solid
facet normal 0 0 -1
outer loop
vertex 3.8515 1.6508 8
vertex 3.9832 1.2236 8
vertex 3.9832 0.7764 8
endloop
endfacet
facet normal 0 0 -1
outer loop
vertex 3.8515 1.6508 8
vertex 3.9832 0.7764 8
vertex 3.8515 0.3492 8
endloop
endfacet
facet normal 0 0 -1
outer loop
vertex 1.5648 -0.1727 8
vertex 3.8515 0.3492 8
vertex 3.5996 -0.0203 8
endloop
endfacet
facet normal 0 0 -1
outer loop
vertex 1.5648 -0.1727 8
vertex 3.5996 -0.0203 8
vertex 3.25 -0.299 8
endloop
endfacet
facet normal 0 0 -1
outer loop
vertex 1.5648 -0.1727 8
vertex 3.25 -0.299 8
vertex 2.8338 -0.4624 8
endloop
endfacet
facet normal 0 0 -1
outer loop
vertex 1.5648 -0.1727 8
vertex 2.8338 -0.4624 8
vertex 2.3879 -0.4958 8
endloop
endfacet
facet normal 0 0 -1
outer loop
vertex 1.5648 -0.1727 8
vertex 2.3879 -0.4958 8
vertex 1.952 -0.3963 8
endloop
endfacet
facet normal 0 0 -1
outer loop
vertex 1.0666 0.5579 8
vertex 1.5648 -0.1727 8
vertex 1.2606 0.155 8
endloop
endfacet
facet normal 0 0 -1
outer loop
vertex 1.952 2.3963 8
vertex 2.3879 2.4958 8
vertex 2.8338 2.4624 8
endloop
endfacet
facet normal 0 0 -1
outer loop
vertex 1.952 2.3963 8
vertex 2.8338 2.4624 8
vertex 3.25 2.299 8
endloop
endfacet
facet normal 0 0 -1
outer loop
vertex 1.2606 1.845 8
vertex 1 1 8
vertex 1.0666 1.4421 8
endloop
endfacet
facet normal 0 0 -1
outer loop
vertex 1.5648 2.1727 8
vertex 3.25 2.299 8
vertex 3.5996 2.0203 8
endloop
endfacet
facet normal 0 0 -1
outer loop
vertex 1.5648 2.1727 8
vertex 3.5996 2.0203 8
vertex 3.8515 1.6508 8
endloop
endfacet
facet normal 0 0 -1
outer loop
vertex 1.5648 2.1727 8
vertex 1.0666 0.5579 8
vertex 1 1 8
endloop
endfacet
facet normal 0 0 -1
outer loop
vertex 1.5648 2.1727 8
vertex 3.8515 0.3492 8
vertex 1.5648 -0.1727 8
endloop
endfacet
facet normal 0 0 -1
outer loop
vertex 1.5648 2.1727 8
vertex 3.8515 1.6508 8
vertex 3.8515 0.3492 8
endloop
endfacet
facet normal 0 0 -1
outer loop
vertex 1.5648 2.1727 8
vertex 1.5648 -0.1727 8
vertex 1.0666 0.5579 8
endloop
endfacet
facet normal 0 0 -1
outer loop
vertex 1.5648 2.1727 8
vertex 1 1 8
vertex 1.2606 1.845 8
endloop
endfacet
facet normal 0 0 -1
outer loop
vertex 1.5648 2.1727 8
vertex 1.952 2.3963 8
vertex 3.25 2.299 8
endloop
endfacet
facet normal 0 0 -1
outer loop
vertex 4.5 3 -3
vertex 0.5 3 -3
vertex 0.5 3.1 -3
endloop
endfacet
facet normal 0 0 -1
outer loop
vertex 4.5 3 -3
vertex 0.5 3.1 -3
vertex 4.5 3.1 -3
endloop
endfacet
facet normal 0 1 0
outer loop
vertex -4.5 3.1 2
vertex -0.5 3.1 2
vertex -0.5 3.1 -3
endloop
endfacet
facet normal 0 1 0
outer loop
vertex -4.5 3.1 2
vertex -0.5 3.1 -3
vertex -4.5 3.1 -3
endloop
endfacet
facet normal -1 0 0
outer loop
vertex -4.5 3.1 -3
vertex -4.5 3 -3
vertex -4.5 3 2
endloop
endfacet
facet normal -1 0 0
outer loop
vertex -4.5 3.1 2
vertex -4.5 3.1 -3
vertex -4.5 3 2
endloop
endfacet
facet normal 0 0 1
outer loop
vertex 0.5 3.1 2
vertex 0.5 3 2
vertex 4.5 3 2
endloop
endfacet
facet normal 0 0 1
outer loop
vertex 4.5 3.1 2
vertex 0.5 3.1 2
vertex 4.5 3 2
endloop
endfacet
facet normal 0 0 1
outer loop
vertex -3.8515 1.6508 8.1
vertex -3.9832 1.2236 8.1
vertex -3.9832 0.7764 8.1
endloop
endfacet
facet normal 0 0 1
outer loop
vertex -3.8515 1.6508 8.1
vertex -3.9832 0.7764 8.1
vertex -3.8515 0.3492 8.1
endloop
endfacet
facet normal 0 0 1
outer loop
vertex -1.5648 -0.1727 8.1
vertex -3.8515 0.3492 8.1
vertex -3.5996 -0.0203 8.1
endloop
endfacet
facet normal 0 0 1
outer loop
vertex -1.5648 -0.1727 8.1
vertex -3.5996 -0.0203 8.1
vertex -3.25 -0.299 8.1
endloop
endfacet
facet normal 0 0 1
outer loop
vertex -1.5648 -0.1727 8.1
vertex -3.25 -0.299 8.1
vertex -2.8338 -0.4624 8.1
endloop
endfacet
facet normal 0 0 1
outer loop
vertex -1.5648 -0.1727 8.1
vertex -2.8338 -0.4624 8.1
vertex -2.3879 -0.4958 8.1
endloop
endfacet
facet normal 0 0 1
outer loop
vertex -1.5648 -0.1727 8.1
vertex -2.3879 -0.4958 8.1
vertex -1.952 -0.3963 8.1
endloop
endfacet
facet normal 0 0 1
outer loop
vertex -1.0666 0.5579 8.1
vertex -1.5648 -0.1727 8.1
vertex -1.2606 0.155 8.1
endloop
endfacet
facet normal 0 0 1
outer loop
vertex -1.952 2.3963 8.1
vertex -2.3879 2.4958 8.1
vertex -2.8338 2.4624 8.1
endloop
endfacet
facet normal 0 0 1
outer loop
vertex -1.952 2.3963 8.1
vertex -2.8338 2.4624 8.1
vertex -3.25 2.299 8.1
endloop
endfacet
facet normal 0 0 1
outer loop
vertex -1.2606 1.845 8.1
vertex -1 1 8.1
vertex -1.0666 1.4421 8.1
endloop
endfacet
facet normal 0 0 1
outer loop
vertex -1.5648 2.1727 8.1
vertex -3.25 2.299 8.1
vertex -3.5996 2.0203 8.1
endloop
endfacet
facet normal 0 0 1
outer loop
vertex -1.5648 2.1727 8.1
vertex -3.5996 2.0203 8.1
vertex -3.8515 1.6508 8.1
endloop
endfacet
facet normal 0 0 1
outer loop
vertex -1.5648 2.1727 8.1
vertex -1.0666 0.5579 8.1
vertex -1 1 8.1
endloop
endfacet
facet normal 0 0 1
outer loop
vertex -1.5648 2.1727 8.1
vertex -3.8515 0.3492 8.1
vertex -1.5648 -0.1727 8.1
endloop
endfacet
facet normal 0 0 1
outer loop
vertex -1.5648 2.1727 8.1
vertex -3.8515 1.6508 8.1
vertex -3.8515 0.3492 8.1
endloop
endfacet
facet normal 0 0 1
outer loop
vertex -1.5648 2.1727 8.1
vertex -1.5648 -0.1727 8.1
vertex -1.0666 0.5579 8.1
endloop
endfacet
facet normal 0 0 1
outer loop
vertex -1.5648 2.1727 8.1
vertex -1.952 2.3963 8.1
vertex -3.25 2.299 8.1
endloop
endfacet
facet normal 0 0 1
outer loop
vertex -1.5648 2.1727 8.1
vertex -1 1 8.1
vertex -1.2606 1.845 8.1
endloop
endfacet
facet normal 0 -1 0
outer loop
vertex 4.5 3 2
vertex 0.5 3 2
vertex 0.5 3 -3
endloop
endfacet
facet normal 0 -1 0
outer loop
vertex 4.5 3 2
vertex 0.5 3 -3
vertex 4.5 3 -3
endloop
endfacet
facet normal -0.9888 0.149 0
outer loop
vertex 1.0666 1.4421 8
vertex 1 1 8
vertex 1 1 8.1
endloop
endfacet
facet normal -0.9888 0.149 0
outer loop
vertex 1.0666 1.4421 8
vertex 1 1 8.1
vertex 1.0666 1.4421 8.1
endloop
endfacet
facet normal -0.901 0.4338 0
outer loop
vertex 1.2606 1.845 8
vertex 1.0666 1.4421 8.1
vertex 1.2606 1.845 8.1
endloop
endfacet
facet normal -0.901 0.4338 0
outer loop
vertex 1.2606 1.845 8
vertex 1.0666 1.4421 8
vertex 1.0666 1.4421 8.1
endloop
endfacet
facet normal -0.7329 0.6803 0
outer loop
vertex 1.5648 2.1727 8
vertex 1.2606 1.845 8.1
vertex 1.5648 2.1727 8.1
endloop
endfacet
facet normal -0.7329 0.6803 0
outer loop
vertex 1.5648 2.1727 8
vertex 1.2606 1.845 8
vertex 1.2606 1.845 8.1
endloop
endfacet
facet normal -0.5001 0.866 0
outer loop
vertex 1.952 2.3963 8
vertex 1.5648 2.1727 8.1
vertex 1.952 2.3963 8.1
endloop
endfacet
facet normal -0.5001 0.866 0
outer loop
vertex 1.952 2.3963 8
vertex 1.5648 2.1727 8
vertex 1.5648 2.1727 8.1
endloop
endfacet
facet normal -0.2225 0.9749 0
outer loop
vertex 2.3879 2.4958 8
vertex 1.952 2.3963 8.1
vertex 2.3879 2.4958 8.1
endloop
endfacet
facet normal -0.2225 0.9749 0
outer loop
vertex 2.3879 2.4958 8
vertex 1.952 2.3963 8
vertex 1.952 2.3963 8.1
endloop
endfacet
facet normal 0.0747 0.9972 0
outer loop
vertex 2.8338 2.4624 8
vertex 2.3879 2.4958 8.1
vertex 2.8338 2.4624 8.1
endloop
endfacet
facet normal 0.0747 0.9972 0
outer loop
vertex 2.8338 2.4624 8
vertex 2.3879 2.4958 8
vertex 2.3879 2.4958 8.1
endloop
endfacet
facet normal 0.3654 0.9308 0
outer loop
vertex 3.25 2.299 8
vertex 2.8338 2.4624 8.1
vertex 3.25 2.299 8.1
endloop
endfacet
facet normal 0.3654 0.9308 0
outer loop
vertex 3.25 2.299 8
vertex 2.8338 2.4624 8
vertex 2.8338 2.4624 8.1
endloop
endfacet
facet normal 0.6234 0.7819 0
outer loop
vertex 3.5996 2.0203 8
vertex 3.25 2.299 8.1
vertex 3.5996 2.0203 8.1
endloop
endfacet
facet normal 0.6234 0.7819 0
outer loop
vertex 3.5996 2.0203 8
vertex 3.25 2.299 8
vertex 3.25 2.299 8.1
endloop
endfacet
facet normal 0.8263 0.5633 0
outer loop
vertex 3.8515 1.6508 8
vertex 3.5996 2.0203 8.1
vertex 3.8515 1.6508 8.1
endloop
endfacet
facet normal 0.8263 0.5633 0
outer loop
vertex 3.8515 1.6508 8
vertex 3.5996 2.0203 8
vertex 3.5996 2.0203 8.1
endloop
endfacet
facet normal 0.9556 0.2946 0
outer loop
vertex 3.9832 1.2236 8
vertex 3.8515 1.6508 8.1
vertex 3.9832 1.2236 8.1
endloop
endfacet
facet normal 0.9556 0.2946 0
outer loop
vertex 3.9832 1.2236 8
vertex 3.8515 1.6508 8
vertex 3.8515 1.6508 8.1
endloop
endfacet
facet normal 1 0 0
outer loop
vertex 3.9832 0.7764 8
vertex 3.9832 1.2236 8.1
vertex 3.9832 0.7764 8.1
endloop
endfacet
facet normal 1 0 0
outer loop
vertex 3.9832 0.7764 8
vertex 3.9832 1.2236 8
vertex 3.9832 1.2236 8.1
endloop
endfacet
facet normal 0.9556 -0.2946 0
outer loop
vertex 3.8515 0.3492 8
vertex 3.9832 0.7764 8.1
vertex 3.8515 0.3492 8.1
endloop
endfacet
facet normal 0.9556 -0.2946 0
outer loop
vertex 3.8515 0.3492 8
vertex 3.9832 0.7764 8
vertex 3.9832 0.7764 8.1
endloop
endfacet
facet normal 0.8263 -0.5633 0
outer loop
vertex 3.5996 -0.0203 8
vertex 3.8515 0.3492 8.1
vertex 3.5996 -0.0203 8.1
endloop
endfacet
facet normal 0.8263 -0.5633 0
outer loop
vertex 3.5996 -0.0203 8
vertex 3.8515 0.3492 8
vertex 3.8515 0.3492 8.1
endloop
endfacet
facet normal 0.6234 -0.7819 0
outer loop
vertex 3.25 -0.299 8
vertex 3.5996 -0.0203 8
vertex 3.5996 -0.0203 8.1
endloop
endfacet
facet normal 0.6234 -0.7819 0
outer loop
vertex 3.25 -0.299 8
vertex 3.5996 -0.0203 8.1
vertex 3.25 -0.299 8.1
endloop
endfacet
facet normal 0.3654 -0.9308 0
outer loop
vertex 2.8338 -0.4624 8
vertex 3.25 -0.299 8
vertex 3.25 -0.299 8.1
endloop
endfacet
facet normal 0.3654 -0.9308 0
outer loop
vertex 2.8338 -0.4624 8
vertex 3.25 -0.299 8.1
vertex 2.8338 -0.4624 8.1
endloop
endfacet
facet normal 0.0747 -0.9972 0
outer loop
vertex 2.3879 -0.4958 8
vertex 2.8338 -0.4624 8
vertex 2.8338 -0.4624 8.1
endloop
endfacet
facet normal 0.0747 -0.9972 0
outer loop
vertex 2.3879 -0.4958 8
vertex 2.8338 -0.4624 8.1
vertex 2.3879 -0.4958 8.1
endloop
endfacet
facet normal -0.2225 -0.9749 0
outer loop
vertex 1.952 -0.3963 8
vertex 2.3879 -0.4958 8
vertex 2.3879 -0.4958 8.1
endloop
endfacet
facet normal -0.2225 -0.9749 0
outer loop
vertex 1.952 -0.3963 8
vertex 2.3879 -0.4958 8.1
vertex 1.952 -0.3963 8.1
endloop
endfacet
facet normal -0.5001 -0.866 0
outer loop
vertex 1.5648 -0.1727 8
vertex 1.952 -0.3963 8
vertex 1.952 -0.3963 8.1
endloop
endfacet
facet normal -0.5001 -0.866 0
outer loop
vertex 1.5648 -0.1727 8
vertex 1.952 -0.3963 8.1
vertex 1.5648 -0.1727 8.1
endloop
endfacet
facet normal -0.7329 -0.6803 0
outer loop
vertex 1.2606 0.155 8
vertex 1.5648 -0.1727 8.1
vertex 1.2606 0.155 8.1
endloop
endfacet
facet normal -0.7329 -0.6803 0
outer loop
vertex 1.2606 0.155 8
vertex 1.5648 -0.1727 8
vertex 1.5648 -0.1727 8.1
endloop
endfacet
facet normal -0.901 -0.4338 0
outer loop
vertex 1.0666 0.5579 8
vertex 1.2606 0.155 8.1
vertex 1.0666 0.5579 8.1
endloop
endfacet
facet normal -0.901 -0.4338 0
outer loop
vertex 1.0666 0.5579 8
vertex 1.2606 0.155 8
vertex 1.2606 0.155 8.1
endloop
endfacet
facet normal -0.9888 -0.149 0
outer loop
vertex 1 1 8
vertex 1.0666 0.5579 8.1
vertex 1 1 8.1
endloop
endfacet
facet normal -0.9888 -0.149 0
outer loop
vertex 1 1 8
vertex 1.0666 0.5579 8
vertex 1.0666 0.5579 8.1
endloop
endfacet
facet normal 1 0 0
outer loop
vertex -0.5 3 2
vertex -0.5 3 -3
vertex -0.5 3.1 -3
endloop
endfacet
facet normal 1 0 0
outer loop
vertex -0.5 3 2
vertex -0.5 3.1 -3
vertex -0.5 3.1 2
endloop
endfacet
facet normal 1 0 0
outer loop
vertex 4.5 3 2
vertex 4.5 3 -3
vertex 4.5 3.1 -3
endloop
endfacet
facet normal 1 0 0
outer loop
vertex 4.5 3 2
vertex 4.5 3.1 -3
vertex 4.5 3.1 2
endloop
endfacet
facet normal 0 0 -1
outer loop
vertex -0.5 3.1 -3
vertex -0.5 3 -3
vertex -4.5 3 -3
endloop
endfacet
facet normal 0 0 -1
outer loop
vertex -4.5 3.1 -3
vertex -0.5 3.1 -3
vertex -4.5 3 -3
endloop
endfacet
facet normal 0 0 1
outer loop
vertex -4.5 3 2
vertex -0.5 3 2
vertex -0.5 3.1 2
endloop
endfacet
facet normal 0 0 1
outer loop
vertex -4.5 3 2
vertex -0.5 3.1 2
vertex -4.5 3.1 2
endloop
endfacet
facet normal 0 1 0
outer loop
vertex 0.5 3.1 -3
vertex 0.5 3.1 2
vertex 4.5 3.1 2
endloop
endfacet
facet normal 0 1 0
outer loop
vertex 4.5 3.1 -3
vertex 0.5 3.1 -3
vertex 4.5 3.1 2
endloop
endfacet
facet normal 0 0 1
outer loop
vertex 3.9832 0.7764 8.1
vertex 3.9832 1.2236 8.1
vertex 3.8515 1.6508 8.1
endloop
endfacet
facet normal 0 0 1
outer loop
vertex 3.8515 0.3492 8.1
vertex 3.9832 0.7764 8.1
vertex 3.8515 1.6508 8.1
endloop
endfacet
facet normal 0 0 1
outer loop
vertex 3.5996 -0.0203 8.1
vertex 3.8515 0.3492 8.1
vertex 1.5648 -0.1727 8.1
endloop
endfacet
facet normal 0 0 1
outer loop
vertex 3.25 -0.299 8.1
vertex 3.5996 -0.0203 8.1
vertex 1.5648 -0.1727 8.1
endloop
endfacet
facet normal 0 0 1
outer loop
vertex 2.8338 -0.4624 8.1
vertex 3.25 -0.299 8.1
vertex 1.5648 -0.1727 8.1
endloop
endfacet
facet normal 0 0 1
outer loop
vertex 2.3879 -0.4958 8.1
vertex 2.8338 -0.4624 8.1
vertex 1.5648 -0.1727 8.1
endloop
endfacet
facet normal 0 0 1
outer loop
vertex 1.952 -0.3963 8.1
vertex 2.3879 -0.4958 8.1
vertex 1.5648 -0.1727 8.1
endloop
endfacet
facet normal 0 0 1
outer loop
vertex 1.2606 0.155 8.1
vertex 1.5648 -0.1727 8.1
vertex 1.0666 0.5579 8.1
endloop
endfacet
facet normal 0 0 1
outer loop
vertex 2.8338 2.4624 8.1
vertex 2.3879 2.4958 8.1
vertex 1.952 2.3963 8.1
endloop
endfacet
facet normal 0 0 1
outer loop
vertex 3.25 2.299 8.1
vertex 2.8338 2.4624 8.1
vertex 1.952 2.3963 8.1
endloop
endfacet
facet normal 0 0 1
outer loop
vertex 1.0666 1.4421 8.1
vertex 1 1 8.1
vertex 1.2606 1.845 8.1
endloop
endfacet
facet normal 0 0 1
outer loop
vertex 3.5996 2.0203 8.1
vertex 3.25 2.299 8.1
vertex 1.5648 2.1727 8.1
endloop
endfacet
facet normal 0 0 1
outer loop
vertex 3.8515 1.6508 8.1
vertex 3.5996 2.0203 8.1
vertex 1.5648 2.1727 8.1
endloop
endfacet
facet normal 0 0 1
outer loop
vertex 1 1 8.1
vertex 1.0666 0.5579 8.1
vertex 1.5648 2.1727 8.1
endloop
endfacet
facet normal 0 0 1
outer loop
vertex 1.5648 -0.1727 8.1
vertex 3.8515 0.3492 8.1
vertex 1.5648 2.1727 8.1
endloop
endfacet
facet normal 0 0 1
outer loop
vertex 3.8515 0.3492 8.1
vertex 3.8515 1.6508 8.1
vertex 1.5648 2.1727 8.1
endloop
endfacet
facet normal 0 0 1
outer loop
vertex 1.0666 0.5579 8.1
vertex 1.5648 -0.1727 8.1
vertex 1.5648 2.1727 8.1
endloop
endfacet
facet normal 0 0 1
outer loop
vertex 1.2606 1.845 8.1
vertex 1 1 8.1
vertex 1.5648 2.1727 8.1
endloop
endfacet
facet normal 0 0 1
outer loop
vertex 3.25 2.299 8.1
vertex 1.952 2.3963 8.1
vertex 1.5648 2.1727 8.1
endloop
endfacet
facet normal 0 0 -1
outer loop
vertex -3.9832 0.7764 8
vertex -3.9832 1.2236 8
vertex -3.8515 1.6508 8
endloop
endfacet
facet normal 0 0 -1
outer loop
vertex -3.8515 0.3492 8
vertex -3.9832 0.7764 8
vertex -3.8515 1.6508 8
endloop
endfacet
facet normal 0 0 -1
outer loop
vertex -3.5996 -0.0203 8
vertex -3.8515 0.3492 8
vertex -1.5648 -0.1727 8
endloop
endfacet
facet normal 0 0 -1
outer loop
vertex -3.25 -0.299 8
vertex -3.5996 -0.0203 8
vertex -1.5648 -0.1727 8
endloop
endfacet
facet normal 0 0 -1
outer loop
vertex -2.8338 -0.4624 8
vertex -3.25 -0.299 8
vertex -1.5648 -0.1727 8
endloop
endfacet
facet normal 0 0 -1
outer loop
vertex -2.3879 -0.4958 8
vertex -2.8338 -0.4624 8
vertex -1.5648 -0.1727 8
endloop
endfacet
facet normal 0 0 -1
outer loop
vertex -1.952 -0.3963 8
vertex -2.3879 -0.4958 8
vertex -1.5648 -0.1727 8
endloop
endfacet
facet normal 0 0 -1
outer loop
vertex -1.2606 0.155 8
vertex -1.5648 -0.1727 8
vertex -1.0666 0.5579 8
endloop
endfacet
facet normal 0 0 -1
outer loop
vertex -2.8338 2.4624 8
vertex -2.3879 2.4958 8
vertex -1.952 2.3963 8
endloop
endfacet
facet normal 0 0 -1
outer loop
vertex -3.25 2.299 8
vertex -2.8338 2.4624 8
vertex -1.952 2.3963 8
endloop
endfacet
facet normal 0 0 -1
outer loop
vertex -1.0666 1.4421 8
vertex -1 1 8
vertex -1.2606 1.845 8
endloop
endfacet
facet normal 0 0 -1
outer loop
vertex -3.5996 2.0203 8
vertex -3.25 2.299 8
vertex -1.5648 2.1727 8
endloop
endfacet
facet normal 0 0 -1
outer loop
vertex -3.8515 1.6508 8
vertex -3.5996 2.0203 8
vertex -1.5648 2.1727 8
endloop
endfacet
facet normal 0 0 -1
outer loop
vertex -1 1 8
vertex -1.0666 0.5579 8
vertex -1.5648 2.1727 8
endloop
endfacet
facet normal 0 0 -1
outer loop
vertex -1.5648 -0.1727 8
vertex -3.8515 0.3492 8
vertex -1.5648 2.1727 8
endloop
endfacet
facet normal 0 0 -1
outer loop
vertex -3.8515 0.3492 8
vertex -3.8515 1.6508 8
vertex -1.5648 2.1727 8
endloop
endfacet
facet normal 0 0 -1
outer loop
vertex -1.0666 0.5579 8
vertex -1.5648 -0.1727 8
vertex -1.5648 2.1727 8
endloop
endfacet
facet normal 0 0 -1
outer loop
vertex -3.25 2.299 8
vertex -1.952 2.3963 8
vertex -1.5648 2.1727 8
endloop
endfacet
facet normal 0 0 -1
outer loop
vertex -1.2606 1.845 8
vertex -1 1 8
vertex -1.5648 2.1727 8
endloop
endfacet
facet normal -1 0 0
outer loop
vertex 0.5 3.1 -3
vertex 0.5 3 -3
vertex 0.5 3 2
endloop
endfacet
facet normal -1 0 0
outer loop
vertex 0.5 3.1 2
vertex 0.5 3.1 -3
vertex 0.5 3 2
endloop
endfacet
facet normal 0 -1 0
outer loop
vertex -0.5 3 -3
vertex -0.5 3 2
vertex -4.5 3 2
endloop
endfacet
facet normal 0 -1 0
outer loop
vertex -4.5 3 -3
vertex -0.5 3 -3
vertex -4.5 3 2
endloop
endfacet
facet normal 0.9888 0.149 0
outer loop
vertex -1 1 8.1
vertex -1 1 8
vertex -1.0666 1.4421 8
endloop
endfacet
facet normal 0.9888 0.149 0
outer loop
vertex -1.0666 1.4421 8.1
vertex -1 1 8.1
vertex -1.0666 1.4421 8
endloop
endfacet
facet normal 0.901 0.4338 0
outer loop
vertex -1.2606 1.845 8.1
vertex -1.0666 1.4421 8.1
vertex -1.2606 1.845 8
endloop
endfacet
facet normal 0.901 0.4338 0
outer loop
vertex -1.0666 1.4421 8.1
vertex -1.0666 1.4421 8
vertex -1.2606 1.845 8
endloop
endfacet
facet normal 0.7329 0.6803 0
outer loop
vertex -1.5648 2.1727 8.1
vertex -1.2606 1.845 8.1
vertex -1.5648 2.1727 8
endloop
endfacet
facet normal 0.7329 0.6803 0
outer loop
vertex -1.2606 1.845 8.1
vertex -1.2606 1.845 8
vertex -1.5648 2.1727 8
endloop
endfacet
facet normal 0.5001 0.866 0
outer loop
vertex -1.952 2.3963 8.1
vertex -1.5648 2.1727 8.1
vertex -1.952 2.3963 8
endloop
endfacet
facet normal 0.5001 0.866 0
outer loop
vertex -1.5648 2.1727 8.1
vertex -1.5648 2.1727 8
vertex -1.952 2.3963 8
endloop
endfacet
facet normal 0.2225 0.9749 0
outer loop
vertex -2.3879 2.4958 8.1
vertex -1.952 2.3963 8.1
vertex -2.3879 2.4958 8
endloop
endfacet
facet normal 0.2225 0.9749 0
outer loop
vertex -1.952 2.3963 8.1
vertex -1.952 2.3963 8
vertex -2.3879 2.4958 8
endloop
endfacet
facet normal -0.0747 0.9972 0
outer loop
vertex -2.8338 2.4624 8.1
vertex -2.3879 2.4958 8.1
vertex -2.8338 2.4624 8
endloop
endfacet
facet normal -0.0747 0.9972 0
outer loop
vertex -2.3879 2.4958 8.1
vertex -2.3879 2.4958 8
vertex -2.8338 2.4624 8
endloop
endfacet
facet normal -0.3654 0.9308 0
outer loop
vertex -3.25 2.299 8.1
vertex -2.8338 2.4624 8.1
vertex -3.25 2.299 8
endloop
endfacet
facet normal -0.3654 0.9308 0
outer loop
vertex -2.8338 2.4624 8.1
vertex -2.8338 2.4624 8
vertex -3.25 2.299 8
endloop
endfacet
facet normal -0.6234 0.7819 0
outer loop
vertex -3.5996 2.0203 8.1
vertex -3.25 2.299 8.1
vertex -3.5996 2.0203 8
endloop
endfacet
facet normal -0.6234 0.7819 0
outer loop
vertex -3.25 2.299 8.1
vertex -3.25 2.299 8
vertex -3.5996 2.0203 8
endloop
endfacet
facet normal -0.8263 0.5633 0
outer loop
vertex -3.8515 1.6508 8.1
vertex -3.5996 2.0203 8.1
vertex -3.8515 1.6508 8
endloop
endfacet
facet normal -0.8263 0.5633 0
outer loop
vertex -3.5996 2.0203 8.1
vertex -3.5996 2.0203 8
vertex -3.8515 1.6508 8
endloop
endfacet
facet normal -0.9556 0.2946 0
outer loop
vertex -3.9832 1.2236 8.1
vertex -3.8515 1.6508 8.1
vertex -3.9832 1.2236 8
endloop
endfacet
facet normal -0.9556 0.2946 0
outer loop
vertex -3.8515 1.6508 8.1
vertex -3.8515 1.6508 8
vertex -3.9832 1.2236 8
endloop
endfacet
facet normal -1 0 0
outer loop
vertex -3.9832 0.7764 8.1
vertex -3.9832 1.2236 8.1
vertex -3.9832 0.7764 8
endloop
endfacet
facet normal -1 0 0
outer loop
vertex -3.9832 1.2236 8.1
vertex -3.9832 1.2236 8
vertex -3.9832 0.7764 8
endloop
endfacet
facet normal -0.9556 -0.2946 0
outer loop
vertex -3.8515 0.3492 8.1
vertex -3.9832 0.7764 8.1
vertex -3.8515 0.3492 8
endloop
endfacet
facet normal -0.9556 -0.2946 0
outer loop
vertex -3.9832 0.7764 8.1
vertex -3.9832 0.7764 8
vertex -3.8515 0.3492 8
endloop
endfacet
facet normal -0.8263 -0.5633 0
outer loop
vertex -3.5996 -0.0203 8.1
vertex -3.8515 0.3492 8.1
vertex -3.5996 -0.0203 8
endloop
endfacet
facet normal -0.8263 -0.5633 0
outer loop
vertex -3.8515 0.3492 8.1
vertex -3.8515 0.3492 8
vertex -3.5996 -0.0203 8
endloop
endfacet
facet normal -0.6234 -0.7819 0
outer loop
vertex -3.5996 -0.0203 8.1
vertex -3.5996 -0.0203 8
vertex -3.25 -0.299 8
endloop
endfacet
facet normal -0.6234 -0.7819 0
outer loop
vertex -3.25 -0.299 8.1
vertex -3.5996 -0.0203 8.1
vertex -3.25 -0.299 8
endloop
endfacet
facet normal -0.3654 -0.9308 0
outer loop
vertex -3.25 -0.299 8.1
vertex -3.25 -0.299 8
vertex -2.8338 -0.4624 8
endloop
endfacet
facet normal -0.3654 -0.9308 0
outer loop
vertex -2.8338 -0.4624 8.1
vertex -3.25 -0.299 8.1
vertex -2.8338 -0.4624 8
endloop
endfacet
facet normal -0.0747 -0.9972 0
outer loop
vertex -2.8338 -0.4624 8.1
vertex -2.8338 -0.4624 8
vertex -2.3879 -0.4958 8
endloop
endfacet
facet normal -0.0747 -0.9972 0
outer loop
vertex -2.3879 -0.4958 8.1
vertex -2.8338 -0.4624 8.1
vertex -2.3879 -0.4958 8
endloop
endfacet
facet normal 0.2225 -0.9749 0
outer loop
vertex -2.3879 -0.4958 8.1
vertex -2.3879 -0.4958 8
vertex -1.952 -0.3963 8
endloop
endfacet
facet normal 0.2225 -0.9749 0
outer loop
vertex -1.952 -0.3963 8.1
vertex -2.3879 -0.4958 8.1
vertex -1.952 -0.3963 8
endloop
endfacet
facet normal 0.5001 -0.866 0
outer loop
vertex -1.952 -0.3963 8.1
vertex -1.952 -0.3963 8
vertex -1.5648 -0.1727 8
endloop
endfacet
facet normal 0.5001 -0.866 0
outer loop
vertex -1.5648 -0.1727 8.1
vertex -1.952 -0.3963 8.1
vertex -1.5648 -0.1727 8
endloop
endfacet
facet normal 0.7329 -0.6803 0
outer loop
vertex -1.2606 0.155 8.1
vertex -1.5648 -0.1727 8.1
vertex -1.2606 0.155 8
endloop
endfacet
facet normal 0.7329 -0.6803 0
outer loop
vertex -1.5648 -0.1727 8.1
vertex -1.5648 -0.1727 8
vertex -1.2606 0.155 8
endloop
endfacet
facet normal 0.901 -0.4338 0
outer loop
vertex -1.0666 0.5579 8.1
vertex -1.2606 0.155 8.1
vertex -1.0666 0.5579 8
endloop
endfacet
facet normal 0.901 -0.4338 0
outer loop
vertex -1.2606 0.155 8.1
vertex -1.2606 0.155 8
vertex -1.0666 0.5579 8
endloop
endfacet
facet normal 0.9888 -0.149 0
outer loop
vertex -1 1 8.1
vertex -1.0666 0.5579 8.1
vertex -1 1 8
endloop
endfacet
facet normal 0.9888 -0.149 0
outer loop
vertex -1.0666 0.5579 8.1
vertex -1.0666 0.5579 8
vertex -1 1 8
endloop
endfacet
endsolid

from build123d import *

# Parameters (mm, degrees)
SKETCH007_W  = 4
SKETCH007_H  = 5
PAD005_DEPTH = 0.1
SKETCH008_R  = 1.5
PAD006_DEPTH = 0.1


with BuildPart() as part:
    # Sketch007 (on DatumPlane) → Pad005 (new body)
    with BuildSketch(Plane(origin=(0, 3, 6), x_dir=(-1, 0, 0), z_dir=(0, 1, 0))):
        with Locations((2.5, -6.5)):
            Rectangle(SKETCH007_W, SKETCH007_H)
    pad005 = extrude(amount=PAD005_DEPTH)

    # Mirrored: Pad005 across Sketch007 V_Axis
    add(pad005.mirror(Plane(origin=(0, 3, 6), x_dir=(0, 1, 0), z_dir=(-1, 0, 0))))

    # Sketch008 (on DatumPlane) → Pad006 (join)
    with BuildSketch(Plane.XY.offset(8)):
        with Locations((-2.5, 1)):
            Circle(SKETCH008_R)
    pad006 = extrude(amount=PAD006_DEPTH)

    # Mirrored001: Pad006 across Sketch008 V_Axis
    add(pad006.mirror(Plane(origin=(0, 0, 8), x_dir=(0, 0, 1), z_dir=(1, 0, 0))))


solid = part.part
